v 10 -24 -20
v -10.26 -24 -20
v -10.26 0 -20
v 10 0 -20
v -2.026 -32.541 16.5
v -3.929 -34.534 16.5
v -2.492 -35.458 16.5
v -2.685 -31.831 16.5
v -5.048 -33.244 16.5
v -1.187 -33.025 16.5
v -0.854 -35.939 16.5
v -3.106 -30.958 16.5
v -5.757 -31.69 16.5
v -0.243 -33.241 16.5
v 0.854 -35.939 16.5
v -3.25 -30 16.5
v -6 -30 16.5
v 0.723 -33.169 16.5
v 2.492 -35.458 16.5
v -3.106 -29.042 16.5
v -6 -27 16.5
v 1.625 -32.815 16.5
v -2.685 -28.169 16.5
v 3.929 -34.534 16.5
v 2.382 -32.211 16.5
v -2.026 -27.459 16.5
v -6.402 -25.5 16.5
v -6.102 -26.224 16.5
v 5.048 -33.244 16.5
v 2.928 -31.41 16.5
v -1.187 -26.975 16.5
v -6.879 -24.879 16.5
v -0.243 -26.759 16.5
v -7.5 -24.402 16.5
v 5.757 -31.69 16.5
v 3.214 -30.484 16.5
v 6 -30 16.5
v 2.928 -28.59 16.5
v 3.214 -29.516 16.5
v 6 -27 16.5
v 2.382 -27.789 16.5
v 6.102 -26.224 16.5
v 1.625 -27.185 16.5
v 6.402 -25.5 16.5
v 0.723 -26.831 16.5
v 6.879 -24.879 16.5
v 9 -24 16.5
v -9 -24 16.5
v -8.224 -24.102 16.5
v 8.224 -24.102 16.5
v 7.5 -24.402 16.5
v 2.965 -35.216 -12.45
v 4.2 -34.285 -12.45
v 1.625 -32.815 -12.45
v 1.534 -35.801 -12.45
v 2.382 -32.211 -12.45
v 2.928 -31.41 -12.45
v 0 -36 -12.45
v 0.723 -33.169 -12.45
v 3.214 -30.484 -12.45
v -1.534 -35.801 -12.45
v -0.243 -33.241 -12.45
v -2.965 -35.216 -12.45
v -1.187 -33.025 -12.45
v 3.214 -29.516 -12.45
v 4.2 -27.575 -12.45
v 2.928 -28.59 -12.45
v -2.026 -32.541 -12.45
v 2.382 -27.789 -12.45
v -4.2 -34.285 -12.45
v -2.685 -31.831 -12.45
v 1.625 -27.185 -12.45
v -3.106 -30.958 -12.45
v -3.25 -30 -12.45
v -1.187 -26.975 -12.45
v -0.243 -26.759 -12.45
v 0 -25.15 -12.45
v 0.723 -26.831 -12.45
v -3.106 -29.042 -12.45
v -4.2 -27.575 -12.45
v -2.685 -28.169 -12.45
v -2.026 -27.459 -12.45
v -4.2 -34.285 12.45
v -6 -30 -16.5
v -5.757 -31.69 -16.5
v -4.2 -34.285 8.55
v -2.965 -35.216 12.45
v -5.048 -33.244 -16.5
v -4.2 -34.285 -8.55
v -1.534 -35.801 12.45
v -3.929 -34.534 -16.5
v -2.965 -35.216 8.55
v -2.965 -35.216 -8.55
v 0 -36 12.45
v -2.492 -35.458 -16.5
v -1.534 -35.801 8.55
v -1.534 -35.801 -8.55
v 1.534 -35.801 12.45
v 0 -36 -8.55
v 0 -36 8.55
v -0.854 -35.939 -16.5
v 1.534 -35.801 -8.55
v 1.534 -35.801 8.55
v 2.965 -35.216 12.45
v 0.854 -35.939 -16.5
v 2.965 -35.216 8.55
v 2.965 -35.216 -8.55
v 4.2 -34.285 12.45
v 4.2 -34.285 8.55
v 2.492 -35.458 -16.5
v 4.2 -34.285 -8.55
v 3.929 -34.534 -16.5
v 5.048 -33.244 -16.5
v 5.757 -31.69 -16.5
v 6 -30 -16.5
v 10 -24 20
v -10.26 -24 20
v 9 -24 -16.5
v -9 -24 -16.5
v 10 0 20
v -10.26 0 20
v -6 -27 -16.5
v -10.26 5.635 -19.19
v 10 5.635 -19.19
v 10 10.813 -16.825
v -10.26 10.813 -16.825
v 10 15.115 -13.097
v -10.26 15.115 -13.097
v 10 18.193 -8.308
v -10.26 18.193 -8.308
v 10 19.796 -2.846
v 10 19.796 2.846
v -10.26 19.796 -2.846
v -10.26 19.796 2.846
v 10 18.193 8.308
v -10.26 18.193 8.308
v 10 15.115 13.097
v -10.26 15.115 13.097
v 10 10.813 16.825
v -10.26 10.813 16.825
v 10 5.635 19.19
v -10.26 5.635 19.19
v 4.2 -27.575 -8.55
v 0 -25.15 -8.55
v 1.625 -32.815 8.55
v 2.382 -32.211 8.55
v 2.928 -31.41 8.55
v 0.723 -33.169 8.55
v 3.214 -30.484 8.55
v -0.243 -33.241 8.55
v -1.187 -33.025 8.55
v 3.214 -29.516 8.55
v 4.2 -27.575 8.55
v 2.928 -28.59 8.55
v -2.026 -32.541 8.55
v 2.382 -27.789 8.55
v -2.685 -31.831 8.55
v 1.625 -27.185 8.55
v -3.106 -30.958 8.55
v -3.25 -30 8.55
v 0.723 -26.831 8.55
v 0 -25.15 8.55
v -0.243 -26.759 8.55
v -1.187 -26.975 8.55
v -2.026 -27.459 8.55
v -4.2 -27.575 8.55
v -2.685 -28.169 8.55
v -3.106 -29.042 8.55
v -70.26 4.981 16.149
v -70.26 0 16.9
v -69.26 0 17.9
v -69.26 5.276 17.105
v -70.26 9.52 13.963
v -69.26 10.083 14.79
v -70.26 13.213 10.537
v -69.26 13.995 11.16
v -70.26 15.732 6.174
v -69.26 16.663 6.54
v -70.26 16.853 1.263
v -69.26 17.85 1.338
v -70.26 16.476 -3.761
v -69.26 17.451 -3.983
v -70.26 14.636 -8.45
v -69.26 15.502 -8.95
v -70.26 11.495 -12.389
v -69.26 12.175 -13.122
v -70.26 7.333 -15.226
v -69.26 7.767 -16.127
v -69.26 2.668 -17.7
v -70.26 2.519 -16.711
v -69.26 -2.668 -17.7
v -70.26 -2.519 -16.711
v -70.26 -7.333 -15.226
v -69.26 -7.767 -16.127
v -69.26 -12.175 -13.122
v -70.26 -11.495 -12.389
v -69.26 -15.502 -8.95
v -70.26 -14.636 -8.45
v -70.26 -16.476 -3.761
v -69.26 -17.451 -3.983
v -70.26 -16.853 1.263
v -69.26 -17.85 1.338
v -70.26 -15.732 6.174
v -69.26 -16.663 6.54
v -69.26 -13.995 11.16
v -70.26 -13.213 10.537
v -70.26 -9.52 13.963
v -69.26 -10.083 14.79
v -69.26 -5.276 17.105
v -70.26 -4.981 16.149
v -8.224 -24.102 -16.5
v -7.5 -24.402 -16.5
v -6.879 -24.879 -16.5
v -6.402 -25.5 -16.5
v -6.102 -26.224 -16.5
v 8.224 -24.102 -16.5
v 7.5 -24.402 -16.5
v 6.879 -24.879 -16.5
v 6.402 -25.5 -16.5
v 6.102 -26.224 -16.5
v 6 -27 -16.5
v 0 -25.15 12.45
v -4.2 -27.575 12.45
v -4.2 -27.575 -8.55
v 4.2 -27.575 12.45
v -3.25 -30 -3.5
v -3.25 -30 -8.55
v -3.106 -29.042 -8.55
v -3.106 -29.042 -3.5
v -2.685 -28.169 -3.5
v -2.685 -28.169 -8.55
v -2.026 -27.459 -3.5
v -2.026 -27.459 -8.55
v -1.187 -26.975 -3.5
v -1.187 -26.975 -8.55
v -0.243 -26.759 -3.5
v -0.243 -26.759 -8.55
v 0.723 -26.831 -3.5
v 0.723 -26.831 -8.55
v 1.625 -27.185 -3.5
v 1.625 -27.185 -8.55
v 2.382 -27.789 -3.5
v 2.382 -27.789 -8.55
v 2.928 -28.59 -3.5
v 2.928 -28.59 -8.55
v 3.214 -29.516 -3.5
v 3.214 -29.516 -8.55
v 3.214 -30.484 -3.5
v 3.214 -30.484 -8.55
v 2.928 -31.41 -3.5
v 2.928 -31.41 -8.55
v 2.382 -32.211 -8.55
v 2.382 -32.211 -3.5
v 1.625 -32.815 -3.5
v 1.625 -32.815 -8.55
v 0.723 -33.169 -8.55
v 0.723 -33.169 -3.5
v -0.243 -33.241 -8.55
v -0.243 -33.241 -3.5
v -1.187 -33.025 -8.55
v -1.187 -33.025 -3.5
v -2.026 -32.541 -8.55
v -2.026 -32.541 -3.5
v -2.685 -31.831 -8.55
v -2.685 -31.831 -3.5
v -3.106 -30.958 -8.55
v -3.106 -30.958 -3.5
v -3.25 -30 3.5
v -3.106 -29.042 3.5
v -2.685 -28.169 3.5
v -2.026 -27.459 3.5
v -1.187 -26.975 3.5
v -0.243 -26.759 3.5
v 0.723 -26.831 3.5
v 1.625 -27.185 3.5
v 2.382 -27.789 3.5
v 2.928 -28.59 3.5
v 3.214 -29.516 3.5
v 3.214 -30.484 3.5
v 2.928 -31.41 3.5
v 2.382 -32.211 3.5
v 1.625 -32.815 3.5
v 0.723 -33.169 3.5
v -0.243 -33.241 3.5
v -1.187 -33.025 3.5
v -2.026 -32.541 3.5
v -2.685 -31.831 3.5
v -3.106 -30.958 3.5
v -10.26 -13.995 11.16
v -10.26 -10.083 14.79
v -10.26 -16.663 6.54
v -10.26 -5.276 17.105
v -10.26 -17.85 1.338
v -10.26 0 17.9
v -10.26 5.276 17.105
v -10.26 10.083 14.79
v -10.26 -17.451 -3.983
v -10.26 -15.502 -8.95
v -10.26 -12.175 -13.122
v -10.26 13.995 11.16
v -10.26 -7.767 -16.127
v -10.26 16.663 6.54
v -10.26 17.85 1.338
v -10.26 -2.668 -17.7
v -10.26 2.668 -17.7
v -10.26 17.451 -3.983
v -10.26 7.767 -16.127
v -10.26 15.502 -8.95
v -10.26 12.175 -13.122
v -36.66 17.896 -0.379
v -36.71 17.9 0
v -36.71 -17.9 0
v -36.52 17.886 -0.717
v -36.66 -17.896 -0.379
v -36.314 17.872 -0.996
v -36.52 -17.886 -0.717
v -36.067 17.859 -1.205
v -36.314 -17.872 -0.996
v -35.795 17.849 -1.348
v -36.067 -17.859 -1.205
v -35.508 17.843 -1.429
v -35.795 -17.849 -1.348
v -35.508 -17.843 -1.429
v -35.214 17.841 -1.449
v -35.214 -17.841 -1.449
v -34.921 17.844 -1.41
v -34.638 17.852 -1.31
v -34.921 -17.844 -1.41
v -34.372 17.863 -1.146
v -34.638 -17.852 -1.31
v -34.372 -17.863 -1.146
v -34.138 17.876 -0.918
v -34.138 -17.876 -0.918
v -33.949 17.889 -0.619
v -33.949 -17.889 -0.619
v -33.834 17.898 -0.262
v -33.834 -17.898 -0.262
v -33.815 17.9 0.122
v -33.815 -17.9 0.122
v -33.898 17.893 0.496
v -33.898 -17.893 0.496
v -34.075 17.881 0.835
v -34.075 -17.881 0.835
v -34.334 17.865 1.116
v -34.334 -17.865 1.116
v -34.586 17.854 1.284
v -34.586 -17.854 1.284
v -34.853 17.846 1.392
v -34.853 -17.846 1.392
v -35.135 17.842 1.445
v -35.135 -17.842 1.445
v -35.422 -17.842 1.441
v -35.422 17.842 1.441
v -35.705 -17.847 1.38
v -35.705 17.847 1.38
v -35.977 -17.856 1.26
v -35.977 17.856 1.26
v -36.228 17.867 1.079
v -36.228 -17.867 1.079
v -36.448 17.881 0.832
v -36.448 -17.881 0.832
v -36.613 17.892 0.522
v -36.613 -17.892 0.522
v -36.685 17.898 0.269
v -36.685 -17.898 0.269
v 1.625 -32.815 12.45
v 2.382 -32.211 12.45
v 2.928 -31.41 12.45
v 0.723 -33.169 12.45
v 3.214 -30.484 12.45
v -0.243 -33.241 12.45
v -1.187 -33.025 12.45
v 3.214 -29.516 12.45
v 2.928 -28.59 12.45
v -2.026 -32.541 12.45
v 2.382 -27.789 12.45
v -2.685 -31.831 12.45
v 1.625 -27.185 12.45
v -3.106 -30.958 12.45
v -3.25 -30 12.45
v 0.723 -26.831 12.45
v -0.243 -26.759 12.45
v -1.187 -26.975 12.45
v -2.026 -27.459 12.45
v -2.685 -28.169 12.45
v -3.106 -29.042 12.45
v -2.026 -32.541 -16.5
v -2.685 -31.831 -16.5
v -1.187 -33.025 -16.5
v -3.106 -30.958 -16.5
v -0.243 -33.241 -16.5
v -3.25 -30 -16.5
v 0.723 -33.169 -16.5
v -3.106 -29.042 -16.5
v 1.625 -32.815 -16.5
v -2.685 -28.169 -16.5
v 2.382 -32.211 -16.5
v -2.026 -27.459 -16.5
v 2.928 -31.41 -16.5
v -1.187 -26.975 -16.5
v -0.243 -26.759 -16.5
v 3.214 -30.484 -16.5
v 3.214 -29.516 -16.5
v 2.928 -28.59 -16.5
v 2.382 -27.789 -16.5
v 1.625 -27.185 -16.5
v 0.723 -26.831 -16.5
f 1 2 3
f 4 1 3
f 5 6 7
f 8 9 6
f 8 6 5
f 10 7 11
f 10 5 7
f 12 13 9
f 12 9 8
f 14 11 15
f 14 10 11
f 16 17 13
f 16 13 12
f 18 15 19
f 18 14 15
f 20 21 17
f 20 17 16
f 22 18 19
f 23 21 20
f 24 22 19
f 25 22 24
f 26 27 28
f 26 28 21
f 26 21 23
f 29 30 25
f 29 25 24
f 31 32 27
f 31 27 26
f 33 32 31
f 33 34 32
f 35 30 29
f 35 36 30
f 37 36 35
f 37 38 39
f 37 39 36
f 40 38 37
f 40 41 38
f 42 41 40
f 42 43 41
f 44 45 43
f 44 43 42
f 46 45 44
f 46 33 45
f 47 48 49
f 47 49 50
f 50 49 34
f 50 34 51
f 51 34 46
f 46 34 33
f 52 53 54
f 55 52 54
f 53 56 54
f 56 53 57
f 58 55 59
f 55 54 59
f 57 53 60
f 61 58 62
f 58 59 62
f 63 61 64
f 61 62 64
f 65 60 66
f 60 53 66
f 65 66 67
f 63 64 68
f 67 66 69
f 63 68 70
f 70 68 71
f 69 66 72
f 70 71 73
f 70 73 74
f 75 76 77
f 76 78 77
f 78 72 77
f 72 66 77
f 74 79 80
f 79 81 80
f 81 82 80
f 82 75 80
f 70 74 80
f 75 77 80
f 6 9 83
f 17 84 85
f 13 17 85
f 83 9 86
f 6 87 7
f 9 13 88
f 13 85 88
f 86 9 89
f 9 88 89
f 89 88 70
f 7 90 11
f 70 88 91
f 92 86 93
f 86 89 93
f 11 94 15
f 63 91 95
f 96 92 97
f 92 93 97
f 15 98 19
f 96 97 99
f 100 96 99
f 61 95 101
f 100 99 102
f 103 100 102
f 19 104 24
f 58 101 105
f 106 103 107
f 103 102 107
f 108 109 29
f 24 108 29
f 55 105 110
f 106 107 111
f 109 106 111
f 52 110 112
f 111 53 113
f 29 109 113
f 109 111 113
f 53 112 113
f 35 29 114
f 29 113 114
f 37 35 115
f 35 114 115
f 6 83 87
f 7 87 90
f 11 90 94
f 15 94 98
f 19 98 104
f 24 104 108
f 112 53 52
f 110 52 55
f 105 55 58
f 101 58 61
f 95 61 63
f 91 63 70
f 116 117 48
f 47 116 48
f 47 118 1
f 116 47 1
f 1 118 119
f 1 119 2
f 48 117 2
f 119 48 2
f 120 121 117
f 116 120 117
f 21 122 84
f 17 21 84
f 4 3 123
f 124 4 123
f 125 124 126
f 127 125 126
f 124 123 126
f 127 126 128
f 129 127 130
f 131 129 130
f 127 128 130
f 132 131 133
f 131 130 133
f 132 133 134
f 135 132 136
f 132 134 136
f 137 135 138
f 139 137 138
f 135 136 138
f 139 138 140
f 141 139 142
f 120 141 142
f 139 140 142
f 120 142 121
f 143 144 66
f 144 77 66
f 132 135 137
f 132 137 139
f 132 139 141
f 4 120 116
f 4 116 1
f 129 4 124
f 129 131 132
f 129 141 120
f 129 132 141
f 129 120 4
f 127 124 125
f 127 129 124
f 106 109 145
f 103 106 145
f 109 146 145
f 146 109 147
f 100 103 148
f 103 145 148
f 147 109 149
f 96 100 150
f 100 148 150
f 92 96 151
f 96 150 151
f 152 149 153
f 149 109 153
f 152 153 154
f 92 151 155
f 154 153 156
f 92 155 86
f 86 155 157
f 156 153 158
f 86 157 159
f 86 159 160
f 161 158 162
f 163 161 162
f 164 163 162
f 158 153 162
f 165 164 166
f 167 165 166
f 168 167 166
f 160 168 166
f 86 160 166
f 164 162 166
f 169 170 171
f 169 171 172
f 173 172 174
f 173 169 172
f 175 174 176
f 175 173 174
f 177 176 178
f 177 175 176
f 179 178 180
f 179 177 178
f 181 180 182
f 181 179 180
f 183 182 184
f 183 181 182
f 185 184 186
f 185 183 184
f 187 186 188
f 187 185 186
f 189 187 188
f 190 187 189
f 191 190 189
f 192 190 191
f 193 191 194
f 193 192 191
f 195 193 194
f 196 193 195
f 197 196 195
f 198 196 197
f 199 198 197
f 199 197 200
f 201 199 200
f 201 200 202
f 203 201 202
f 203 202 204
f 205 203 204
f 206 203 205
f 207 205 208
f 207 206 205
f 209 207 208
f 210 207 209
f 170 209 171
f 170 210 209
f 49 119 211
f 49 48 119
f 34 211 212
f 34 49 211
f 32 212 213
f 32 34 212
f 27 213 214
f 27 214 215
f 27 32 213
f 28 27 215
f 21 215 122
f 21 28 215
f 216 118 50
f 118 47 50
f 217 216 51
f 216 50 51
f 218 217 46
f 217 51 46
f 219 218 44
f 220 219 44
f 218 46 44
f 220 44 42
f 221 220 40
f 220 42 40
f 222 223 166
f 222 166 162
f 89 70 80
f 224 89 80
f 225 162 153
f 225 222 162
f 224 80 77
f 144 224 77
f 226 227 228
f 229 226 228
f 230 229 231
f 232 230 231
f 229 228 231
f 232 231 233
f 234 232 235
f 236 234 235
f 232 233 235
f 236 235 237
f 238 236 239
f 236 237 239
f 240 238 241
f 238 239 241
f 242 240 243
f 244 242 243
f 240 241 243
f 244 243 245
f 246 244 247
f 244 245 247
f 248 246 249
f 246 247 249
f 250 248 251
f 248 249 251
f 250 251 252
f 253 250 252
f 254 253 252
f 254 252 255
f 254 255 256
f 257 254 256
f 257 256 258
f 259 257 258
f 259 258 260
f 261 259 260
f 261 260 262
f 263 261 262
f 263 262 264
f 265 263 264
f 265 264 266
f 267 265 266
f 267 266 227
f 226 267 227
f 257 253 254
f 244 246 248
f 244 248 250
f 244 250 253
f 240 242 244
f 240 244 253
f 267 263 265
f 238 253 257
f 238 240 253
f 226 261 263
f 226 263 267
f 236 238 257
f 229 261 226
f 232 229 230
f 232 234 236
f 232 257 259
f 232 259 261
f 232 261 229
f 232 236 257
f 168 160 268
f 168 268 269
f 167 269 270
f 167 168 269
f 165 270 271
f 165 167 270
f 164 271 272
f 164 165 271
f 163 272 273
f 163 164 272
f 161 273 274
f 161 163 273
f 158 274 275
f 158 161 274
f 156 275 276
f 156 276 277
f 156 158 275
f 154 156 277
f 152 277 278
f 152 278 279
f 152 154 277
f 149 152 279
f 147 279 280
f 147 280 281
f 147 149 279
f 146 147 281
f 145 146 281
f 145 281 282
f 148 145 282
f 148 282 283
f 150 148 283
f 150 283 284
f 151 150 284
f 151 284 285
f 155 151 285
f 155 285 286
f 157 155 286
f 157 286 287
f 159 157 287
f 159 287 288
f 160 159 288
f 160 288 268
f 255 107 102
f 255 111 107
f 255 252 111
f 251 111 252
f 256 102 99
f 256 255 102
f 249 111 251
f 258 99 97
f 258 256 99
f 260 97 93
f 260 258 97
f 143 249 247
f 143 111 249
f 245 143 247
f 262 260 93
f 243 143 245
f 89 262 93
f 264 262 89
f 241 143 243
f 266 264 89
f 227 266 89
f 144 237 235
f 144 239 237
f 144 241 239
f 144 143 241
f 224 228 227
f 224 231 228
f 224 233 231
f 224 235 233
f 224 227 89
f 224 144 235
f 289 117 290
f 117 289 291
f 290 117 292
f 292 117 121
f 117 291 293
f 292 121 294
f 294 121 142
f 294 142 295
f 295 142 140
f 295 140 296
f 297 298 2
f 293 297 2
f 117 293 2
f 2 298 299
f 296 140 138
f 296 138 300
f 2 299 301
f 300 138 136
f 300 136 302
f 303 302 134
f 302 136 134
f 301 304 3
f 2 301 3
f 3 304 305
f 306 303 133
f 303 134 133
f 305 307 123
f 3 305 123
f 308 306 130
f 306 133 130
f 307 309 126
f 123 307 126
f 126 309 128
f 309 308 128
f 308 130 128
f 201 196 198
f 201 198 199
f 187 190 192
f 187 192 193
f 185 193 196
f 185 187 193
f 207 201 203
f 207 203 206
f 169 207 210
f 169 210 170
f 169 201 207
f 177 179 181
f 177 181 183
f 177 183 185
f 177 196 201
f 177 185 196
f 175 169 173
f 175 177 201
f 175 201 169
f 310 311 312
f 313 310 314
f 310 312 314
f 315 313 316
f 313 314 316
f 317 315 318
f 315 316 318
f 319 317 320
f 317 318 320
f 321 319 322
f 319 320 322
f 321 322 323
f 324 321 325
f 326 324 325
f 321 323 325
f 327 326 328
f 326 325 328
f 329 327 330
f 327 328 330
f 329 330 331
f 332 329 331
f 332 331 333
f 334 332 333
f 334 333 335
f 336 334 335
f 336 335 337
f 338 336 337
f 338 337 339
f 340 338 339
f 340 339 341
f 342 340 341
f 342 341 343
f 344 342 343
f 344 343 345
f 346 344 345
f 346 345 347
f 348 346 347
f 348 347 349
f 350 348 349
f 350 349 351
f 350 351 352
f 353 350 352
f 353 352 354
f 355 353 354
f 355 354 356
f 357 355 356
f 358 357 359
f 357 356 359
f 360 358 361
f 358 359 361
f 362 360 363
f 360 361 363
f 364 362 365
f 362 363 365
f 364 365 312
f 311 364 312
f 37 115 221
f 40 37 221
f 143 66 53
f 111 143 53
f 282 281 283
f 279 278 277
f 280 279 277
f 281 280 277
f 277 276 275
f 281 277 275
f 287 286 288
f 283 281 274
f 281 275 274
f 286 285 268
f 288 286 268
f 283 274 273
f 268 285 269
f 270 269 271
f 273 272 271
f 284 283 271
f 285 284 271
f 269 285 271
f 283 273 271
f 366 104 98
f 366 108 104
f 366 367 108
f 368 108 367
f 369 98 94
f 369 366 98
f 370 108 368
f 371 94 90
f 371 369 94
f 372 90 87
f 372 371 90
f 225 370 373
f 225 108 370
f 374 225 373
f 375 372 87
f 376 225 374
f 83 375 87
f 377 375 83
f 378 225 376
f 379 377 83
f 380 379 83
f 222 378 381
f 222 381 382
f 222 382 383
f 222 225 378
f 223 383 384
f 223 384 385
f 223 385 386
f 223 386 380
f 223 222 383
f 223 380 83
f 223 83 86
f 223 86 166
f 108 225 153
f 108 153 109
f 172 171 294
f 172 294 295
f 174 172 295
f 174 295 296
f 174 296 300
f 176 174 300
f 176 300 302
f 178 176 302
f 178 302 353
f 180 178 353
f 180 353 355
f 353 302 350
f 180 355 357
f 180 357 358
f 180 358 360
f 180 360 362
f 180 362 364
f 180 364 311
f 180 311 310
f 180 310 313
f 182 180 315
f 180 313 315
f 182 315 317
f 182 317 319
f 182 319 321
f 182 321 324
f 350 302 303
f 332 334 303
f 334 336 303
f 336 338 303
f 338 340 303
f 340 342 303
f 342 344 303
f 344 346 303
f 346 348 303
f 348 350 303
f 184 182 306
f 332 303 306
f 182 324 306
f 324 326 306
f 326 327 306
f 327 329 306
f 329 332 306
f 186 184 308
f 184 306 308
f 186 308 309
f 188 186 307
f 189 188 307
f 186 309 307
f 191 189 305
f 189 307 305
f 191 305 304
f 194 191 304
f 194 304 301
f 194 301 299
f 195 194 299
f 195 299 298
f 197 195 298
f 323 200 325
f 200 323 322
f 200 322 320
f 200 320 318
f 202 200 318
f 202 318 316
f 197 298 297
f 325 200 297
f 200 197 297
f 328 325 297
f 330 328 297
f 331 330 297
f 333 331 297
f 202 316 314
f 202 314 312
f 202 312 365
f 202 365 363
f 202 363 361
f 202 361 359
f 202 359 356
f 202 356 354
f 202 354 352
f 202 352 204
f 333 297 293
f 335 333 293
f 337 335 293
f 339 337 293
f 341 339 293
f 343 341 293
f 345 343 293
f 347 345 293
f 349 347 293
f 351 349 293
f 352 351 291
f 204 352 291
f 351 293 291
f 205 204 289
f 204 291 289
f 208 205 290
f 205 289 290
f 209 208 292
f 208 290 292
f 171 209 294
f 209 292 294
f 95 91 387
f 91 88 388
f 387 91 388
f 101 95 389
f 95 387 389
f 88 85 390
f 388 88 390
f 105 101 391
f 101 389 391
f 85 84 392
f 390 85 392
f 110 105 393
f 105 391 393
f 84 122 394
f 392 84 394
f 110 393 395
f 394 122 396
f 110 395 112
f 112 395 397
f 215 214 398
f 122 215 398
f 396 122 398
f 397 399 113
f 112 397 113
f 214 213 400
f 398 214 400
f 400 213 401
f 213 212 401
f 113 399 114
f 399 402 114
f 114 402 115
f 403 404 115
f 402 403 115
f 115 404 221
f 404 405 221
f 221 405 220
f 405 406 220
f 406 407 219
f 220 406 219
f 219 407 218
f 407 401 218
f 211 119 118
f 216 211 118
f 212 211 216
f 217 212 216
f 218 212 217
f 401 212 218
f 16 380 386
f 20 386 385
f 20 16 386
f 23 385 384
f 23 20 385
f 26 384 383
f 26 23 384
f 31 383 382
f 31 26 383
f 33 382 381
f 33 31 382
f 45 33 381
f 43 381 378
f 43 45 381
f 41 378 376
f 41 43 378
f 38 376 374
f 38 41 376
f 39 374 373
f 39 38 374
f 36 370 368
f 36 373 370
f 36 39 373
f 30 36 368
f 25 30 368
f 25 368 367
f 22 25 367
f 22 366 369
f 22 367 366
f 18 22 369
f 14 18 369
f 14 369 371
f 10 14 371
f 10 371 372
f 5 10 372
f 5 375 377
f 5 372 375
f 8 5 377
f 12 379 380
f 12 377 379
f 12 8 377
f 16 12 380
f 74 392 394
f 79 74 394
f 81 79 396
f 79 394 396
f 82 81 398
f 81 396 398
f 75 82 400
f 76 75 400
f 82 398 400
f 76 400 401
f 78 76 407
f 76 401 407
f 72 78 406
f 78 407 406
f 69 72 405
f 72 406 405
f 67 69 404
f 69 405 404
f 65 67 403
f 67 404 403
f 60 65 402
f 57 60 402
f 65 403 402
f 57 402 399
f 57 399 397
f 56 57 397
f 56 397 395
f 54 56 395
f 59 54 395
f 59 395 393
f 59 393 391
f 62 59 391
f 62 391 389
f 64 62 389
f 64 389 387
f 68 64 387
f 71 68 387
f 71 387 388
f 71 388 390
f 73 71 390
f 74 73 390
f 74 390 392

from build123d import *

# Parameters (mm, degrees)
EXTRUDE_1_DEPTH      = 10
EXTRUDE_1_DEPTH_BACK = 10.26
SKETCH_4_R           = 17.9
EXTRUDE_3_DEPTH      = 60
EXTRUDE_7_DEPTH      = 16.5
EXTRUDE_7_DEPTH_BACK = 16.5
SKETCH_15_R          = 6
SKETCH_17_R          = 3.25
CUT_EXTRUDE_3_DEPTH  = 13
CUT_EXTRUDE_4_DEPTH  = 1.95
FILLET_1_R           = 3
HOLE_WIZARD_M2_5_1_D = 2.9
CHAMFER_1_SIZE       = 1


with BuildPart() as part:
    # 스케치1 → 보스-돌출1 (new, two sides: drawn at the far end of the back side and taken through both)
    with BuildSketch(Plane(origin=(0, 0, 0), x_dir=(0, 0, -1), z_dir=(1, 0, 0)).offset(-EXTRUDE_1_DEPTH_BACK)):
        with BuildLine():
            Line((20, -24), (20, 0))
            ThreePointArc((20, 0), (0, 20), (-20, 0))
            Line((-20, 0), (-20, -24))
            Line((-20, -24), (20, -24))
        make_face()
    extrude(amount=EXTRUDE_1_DEPTH + EXTRUDE_1_DEPTH_BACK)

    # 스케치4 → 보스-돌출3 (add)
    with BuildSketch(Plane.ZY.offset(10.26)):
        Circle(SKETCH_4_R)
    extrude(amount=EXTRUDE_3_DEPTH)

    # 스케치15 → 보스-돌출7 (add, two sides: drawn at the far end of the back side and taken through both)
    with BuildSketch(Plane.XY.offset(-EXTRUDE_7_DEPTH_BACK)):
        with BuildLine():
            Line((-6, -24), (-6, -30))
            ThreePointArc((-6, -30), (-4.242640687, -25.757359313), (0, -24))
            Line((0, -24), (-6, -24))
        make_face()
        with Locations((0, -30)):
            Circle(SKETCH_15_R)
        with BuildLine():
            ThreePointArc((0, -24), (4.242640687, -25.757359313), (6, -30))
            Line((6, -30), (6, -24))
            Line((6, -24), (0, -24))
        make_face()
    extrude(amount=EXTRUDE_7_DEPTH + EXTRUDE_7_DEPTH_BACK)

    # 스케치17 → 컷-돌출3 (cut)
    with BuildSketch(Plane(origin=(0, 0, -16.5), x_dir=(-1, 0, 0), z_dir=(0, 0, -1))):
        with Locations((0, -30)):
            Circle(SKETCH_17_R)
    cut_extrude_3 = extrude(amount=-CUT_EXTRUDE_3_DEPTH, mode=Mode.SUBTRACT)

    # 대칭 복사7: 컷-돌출3 across plane
    add(cut_extrude_3.mirror(Plane.XY), mode=Mode.SUBTRACT)

    # 스케치18 → 컷-돌출4 (cut, symmetric)
    with BuildSketch(Plane(origin=(0, 0, -10.5), x_dir=(-1, 0, 0), z_dir=(0, 0, -1))):
        Polygon((-4.2, -36), (4.2, -36), (4.2, -32.424871131), (0, -34.849742261), (-4.2, -32.424871131), align=None)
        Polygon((-4.2, -27.575128869), (-4.2, -32.424871131), (0, -34.849742261), (4.2, -32.424871131), (4.2, -27.575128869), (0, -25.150257739), align=None)
    cut_extrude_4 = extrude(amount=CUT_EXTRUDE_4_DEPTH, both=True, mode=Mode.SUBTRACT)

    # 대칭 복사8: 컷-돌출4 across plane
    add(cut_extrude_4.mirror(Plane.XY), mode=Mode.SUBTRACT)

    # 필렛1
    fillet_1_edges = [part.edges().sort_by_distance(p)[0] for p in [
        (-6, -24, 0),
        (6, -24, 0),
    ]]
    fillet(fillet_1_edges, radius=FILLET_1_R)

    # M2.5 여유 구멍1 (through all)
    with Locations(Plane(origin=(0, 17.9, 0), x_dir=(1, 0, 0), z_dir=(0, 1, 0))):
        with Locations((-35.26, 0)):
            Hole(HOLE_WIZARD_M2_5_1_D / 2)

    # 모따기1
    chamfer_1_edges = [part.edges().sort_by_distance(p)[0] for p in [
        (-70.26, 0, -17.9),
    ]]
    chamfer(chamfer_1_edges, length=CHAMFER_1_SIZE)


solid = part.part
